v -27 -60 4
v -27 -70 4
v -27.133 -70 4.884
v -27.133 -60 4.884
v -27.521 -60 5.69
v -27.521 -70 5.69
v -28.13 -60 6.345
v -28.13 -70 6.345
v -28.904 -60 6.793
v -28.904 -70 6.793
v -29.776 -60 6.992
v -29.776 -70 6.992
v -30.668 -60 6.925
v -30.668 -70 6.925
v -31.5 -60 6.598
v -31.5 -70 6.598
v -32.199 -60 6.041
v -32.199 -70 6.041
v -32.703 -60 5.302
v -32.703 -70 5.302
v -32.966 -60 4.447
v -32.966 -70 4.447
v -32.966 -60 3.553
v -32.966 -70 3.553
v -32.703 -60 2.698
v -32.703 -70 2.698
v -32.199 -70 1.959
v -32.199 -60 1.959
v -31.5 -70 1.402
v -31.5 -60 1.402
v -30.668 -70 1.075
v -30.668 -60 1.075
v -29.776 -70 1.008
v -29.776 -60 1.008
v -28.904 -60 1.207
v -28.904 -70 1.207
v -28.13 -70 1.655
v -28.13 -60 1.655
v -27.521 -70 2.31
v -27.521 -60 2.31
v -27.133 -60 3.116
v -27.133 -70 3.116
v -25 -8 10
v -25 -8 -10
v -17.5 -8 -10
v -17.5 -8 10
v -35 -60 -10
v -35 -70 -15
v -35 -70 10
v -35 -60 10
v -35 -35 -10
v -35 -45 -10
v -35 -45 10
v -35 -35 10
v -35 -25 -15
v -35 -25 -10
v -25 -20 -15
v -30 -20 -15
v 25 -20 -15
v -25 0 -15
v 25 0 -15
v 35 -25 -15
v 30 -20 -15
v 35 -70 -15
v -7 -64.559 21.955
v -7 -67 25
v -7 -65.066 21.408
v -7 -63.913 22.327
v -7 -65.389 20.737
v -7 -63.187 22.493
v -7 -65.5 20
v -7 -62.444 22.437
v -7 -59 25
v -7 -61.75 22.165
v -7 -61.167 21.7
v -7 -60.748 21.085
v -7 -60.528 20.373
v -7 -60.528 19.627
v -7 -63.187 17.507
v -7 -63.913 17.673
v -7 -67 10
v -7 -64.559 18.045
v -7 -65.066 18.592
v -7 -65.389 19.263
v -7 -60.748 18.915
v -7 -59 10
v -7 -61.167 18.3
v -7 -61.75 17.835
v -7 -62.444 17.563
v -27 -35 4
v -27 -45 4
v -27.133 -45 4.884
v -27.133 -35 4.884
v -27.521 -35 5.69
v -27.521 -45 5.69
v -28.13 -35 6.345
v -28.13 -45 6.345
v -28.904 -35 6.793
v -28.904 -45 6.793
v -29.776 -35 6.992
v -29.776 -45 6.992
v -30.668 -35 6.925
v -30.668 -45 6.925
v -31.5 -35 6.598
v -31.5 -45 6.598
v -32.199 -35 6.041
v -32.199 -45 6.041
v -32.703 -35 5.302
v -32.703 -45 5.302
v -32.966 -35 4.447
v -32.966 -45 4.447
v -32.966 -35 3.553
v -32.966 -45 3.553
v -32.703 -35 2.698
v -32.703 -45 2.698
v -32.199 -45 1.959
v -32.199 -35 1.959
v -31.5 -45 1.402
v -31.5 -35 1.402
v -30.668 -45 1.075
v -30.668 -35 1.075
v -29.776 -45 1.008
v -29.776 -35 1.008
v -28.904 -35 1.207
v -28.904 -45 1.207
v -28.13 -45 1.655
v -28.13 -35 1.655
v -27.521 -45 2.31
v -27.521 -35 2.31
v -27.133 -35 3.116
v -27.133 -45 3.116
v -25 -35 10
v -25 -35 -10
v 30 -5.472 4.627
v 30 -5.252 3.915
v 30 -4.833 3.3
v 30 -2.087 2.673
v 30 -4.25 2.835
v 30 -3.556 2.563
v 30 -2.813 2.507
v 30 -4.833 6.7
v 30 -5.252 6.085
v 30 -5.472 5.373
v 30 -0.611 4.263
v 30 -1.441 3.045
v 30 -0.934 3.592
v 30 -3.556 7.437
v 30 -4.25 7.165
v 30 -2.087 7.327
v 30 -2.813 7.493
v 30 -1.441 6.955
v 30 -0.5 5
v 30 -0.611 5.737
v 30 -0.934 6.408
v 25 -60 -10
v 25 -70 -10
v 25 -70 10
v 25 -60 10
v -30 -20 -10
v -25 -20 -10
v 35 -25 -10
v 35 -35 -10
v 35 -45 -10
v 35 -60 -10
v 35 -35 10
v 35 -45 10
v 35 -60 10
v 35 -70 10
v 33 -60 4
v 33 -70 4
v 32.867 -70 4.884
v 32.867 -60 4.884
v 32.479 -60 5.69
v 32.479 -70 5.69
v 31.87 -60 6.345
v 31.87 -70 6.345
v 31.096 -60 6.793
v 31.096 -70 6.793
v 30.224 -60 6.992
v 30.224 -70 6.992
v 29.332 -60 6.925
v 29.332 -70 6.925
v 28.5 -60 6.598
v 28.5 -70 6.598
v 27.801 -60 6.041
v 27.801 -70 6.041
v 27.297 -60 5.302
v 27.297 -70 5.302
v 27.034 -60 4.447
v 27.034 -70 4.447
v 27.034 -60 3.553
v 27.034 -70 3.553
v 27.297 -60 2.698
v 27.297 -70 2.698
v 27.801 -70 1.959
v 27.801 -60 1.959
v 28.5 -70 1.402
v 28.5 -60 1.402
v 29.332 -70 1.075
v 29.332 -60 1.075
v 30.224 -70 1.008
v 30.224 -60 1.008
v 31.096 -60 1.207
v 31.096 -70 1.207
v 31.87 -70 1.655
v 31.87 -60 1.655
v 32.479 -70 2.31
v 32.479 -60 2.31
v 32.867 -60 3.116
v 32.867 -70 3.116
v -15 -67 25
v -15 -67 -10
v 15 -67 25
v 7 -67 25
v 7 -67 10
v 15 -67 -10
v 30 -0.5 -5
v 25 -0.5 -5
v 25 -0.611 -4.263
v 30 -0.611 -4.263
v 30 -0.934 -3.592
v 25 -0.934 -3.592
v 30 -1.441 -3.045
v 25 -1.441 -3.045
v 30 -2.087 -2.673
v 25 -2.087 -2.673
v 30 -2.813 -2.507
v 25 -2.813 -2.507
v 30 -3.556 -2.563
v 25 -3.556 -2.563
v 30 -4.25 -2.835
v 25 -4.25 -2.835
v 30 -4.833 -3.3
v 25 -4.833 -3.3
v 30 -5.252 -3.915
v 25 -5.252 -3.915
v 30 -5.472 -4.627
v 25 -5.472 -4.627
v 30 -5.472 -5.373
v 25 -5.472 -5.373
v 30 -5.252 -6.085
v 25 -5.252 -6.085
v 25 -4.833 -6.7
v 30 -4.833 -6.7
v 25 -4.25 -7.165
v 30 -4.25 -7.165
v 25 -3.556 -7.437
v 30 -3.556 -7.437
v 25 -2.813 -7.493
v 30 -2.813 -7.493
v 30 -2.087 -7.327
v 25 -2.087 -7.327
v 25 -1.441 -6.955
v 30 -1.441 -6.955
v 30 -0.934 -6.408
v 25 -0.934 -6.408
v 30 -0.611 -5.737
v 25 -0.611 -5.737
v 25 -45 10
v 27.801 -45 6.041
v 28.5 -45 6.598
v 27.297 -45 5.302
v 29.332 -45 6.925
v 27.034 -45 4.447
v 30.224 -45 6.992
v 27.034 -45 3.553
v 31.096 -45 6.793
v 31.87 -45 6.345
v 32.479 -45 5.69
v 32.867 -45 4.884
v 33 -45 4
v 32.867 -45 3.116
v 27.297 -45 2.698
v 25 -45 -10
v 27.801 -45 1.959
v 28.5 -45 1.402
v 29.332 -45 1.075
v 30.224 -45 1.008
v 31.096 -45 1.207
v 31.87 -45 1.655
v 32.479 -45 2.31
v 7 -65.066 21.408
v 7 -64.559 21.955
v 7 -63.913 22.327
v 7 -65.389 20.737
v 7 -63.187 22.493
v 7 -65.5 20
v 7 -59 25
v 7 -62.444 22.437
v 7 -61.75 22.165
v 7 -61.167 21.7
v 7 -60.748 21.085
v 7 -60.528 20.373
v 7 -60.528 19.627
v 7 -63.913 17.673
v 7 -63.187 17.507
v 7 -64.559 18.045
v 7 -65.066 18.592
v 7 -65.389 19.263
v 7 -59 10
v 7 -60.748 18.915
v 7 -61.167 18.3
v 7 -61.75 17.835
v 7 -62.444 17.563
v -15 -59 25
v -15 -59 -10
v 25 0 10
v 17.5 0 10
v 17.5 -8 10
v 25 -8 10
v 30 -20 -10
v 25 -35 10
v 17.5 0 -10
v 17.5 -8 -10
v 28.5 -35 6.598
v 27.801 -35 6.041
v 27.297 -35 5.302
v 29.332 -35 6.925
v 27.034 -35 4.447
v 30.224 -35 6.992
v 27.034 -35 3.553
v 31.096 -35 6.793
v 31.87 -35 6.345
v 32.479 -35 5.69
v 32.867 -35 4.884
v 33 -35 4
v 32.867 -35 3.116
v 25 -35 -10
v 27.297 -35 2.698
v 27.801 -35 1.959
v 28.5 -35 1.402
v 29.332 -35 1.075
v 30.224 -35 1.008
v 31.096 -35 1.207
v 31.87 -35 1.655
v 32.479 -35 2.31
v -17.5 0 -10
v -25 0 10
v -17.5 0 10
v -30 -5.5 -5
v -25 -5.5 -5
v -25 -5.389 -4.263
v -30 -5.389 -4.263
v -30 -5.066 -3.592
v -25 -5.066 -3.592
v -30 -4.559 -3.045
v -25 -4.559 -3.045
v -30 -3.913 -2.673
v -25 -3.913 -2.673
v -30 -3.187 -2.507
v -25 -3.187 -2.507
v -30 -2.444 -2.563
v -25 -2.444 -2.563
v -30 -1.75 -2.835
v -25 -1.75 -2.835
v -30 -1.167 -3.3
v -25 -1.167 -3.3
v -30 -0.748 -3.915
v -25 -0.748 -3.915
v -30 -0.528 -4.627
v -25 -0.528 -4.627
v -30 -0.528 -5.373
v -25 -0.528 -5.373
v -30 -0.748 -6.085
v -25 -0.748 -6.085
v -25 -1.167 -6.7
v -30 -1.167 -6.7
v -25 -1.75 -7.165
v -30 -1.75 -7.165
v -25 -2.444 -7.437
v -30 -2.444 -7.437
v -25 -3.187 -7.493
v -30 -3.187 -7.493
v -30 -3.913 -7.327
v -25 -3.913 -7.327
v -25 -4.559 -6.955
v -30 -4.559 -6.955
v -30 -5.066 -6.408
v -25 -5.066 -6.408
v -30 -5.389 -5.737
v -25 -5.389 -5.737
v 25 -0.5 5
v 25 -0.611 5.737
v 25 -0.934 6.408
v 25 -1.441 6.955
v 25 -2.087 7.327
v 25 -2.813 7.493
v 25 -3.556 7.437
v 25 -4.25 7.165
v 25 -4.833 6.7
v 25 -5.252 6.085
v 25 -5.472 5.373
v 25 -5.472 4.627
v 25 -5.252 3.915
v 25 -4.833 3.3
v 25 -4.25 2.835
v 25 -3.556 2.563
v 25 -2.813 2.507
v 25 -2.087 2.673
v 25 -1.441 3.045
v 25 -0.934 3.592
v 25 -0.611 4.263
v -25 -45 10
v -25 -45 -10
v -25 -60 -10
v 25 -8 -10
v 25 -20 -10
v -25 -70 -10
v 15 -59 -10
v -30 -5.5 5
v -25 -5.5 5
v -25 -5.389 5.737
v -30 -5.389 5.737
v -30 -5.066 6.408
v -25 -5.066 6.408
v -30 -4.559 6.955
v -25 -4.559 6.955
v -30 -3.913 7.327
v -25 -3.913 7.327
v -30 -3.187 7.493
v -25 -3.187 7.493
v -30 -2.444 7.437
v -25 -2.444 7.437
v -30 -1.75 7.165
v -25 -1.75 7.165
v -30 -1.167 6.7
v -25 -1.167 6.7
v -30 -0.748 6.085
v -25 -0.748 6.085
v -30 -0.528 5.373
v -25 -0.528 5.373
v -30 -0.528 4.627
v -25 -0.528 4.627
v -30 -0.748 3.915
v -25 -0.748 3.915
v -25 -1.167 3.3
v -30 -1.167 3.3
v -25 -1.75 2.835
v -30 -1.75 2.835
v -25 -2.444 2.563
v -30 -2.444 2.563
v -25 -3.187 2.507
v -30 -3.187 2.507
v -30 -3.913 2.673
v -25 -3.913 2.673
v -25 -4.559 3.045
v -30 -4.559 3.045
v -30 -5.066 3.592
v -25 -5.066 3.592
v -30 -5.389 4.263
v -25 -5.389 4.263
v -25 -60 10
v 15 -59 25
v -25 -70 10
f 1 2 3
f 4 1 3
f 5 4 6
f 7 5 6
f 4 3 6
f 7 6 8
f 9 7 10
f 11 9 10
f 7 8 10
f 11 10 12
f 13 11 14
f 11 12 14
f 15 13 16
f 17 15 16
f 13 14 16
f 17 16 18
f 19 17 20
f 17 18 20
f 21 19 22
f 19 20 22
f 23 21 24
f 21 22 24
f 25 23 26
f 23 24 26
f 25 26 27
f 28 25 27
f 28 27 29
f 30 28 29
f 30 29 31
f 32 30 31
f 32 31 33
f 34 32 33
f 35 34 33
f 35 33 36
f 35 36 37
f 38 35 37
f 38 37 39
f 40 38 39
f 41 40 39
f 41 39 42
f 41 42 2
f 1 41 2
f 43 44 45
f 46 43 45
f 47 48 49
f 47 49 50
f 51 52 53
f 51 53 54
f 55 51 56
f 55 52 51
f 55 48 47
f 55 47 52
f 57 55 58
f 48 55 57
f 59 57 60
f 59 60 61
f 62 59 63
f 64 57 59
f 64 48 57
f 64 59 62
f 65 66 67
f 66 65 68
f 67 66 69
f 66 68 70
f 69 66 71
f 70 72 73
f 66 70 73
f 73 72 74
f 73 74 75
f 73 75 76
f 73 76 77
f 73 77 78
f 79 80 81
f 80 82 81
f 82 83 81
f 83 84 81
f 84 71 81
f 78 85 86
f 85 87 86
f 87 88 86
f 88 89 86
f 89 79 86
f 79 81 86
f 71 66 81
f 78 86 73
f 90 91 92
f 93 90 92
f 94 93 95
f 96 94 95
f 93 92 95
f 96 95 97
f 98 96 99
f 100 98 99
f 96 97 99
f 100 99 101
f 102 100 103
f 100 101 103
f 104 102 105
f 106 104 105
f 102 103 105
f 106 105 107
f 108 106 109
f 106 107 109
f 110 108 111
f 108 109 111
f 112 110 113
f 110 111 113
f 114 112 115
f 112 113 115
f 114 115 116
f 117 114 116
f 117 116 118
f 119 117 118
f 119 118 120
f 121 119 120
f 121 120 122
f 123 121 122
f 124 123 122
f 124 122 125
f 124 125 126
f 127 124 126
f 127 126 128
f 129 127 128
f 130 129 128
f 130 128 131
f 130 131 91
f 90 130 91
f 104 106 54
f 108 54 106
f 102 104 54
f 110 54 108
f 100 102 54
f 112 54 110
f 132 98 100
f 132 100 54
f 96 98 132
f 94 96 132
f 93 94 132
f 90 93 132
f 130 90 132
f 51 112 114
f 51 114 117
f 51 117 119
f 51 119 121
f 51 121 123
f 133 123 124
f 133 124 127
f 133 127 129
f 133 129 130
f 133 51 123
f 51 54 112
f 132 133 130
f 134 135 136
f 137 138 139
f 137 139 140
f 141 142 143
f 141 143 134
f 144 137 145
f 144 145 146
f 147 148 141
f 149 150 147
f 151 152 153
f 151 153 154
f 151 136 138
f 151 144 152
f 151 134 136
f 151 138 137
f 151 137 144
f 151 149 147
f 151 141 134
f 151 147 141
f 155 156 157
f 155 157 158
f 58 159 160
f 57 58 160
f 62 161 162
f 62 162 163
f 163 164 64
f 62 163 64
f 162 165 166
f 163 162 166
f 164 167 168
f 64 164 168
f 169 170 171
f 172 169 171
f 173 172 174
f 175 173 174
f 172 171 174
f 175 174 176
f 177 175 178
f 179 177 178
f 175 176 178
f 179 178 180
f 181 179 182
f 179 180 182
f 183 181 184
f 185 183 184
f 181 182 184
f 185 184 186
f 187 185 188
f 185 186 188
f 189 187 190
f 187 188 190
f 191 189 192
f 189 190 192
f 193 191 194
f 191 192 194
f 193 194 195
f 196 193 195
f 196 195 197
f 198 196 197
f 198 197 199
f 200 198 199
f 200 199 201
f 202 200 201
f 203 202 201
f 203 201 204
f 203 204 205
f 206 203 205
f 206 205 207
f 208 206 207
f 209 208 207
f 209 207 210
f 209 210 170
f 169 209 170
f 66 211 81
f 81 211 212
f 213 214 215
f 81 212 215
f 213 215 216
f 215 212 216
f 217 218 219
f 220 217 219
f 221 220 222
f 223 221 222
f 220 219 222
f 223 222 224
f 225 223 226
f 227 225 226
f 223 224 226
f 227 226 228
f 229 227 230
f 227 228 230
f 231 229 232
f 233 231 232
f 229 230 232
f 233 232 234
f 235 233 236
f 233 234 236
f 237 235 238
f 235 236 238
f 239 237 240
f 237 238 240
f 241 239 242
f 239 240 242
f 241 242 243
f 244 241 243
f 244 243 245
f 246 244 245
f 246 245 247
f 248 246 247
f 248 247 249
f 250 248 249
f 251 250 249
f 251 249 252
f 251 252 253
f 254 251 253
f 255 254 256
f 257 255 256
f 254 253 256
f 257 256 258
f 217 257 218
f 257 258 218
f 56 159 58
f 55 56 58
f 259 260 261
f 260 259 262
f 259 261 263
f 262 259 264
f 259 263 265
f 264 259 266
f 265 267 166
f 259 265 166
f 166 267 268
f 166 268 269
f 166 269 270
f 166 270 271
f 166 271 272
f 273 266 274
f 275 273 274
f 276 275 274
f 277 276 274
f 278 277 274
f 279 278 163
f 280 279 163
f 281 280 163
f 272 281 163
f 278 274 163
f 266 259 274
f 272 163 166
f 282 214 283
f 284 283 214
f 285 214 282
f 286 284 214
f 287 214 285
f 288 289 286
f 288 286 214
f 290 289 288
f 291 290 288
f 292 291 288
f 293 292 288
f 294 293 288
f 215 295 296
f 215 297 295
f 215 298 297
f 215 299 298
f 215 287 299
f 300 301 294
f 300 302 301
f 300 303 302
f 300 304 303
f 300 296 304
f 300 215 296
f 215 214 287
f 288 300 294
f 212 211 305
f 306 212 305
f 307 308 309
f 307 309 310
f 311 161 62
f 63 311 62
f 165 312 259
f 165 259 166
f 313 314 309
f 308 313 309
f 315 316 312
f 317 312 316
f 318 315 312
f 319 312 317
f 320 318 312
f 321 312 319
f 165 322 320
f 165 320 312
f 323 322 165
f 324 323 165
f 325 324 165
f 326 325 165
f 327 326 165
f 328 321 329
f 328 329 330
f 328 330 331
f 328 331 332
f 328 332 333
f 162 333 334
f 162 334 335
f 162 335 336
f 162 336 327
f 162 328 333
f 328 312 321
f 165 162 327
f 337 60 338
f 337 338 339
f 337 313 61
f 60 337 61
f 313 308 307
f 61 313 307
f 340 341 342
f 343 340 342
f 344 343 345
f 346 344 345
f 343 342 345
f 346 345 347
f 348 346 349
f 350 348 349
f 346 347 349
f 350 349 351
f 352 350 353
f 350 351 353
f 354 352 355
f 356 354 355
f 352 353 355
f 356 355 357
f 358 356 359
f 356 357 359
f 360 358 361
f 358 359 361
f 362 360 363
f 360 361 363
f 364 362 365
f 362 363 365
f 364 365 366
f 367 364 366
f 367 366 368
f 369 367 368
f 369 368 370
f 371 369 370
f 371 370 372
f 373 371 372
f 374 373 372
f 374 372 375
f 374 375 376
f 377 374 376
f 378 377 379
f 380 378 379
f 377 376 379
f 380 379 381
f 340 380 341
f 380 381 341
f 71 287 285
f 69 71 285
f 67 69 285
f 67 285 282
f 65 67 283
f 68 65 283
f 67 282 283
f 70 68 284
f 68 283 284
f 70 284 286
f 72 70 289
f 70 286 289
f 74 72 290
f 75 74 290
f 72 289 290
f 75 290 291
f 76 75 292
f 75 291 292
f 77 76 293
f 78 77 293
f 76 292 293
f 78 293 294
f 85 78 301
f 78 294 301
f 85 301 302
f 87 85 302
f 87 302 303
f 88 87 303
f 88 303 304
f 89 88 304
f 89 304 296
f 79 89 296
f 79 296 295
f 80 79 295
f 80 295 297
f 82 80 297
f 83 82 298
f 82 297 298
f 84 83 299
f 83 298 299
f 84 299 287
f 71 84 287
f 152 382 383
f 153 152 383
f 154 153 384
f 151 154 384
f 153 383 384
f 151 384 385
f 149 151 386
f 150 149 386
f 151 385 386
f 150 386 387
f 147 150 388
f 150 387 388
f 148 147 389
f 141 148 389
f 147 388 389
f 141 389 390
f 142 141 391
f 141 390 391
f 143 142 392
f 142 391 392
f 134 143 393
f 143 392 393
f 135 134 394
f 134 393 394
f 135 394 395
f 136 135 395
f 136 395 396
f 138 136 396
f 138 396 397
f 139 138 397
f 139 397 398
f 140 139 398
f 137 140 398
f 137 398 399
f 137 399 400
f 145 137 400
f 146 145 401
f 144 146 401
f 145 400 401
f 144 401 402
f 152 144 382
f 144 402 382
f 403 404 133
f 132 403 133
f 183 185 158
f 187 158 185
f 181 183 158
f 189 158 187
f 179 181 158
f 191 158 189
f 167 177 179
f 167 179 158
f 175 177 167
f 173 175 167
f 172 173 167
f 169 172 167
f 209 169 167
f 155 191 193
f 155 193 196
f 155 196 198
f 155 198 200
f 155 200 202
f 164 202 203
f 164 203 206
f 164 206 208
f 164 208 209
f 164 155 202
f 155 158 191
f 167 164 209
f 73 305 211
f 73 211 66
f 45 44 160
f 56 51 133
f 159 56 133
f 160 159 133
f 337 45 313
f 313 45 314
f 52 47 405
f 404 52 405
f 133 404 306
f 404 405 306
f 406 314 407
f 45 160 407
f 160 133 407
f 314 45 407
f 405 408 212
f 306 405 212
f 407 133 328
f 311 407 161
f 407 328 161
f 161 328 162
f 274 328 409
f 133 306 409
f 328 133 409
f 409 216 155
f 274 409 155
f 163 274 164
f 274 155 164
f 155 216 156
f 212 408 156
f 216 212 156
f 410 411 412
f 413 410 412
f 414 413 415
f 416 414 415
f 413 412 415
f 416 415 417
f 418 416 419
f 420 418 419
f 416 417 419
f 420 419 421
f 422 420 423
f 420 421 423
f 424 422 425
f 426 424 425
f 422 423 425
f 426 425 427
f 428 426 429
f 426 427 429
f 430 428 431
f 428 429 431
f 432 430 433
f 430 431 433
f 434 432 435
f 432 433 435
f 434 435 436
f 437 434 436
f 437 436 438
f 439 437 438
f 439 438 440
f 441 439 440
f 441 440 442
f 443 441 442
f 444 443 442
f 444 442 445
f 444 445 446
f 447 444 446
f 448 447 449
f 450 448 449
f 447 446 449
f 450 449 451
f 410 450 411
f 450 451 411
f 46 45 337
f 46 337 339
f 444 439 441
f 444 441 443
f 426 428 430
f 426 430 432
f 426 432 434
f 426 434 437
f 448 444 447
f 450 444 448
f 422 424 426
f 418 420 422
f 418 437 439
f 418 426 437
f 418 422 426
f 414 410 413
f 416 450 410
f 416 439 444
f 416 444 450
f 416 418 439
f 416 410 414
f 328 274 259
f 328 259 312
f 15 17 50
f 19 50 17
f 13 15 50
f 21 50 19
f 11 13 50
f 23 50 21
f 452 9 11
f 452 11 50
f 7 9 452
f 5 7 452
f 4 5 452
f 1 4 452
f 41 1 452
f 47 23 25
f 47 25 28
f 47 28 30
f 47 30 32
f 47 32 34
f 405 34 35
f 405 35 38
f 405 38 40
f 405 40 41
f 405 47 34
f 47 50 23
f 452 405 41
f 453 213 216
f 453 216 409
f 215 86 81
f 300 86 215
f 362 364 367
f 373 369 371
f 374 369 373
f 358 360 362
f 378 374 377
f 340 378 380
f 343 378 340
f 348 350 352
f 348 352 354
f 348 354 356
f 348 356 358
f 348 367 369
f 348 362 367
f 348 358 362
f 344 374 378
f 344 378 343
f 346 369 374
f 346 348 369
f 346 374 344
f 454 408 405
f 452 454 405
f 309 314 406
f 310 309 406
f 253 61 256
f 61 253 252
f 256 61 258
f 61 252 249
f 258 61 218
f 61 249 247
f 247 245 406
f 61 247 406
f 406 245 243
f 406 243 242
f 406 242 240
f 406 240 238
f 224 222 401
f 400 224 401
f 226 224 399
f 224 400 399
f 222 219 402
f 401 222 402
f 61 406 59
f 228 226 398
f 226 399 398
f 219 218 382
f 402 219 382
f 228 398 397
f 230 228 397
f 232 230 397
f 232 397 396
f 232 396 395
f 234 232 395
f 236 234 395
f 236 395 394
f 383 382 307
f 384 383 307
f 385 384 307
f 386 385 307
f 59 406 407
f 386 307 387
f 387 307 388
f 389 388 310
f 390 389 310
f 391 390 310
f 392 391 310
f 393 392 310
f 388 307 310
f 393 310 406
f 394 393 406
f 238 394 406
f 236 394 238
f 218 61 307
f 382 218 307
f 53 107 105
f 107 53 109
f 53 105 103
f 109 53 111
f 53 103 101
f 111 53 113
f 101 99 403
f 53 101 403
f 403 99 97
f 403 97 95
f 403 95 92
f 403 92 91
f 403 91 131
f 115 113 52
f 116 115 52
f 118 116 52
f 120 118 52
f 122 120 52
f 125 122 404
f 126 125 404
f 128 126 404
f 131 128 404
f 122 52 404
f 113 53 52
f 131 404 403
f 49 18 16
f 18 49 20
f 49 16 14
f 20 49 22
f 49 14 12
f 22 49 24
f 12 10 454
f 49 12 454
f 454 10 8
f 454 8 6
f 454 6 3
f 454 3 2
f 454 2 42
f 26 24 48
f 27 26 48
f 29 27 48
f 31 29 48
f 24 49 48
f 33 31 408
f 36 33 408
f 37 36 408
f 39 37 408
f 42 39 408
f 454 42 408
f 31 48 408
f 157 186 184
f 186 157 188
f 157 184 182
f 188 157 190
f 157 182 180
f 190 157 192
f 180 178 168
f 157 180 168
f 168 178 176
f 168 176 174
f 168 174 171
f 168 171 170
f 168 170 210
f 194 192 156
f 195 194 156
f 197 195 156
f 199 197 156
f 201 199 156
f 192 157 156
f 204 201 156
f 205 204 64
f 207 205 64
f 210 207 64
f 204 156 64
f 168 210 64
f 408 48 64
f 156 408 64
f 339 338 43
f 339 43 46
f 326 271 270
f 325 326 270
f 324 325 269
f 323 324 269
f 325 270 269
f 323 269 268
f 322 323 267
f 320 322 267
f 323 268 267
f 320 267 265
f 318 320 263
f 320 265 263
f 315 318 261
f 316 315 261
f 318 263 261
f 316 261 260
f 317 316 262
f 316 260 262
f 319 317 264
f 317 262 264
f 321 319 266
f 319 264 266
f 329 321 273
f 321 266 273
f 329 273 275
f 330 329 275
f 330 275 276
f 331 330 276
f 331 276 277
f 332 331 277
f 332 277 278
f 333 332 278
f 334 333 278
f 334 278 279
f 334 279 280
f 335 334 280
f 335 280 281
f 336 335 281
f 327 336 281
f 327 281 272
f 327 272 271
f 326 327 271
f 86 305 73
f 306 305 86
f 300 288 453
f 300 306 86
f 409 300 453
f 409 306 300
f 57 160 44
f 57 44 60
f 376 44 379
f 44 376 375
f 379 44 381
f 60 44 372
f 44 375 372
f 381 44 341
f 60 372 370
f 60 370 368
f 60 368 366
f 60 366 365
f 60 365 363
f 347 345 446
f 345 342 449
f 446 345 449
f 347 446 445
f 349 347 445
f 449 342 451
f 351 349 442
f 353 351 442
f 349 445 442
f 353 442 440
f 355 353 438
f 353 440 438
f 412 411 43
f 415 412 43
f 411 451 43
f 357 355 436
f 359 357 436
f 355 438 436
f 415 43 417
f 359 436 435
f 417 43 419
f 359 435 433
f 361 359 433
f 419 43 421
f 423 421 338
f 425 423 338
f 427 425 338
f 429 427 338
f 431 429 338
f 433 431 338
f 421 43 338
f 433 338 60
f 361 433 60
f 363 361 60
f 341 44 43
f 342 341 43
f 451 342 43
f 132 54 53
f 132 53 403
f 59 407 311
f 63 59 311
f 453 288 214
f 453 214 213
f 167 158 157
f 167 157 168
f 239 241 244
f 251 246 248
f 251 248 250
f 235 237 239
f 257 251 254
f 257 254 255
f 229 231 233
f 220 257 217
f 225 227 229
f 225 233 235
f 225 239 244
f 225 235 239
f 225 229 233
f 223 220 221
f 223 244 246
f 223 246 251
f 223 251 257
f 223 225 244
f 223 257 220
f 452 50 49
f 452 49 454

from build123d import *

# Parameters (mm, degrees)
F0_W      = 50
F0_H      = 20
F1_DEPTH  = 8
F2_R      = 2.5
F3_DEPTH  = 5
F4_R      = 2.5
F5_DEPTH  = 5
F6_W      = 35
F6_H      = 30
F7_DEPTH  = 25
F9_DEPTH  = 5
F10_W     = 8
F10_H     = 8
F11_DEPTH = 35
F12_R     = 2.5
F13_DEPTH = 14
F14_W     = 10
F14_H     = 10
F15_DEPTH = 20
F16_R     = 3
F17_DEPTH = 50
F18_SIZE  = 5
F19_SIZE  = 5
F20_W     = 14
F20_H     = 8
F21_DEPTH = 20


with BuildPart() as f1:
    # F0 (on Front) → F1 (new body)
    with BuildSketch(Plane.XZ):
        Rectangle(F0_W, F0_H)
    extrude(amount=F1_DEPTH)

    # F2 (on face) → F3 (join)
    with BuildSketch(Plane(origin=(-25, 0, 0), x_dir=(0, -1, 0), z_dir=(-1, 0, 0))):
        with Locations((3, 5)):
            Circle(F2_R)
        with Locations((3, -5)):
            Circle(F2_R)
    extrude(amount=F3_DEPTH)

    # F4 (on face) → F5 (join)
    with BuildSketch(Plane.YZ.offset(25)):
        with Locations((-3, 5)):
            Circle(F4_R)
        with Locations((-3, -5)):
            Circle(F4_R)
    extrude(amount=F5_DEPTH)

    # F6 (on face) → F7 (cut)
    with BuildSketch(Plane.XZ.offset(8)):
        with Locations((0, 5)):
            Rectangle(F6_W, F6_H)
    extrude(amount=-F7_DEPTH, mode=Mode.SUBTRACT)

    # F8 (on face) → F9 (join)
    with BuildSketch(Plane(origin=(0, 0, -10), x_dir=(1, 0, 0), z_dir=(0, 0, -1))):
        Polygon((-25, 20), (-25, 0), (25, 0), (25, 20), (35, 20), (35, 70), (-35, 70), (-35, 20), align=None)
    extrude(amount=F9_DEPTH)

    # F10 (on face) → F11 (join)
    with BuildSketch(Plane.XY.offset(-10)):
        with Locations((-11, -63)):
            Rectangle(F10_W, F10_H)
        with Locations((11, -63)):
            Rectangle(F10_W, F10_H)
    extrude(amount=F11_DEPTH)

    # F12 (on face) → F13 (join, through all)
    with BuildSketch(Plane(origin=(7, 0, 0), x_dir=(0, -1, 0), z_dir=(-1, 0, 0))):
        with Locations((63, 20)):
            Circle(F12_R)
    extrude(amount=F13_DEPTH)

    # F14 (on face) → F15 (join)
    with BuildSketch(Plane.XY.offset(-10)):
        with Locations((-30, -65)):
            Rectangle(F14_W, F14_H)
        with Locations((30, -65)):
            Rectangle(F14_W, F14_H)
        with Locations((30, -40)):
            Rectangle(F14_W, F14_H)
        with Locations((-30, -40)):
            Rectangle(F14_W, F14_H)
    extrude(amount=F15_DEPTH)

    # F16 (on face) → F17 (cut)
    with BuildSketch(Plane.XZ.offset(70)):
        with Locations((30, 4)):
            Circle(F16_R)
        with Locations((-30, 4)):
            Circle(F16_R)
    extrude(amount=-F17_DEPTH, mode=Mode.SUBTRACT)

    # F18
    f18_edges = [f1.edges().sort_by_distance(p)[0] for p in [
        (-35, -20, -12.5),
    ]]
    chamfer(f18_edges, length=F18_SIZE)

    # F19
    f19_edges = [f1.edges().sort_by_distance(p)[0] for p in [
        (35, -20, -12.5),
    ]]
    chamfer(f19_edges, length=F19_SIZE)

    # F20 (on face) → F21 (join)
    with BuildSketch(Plane.XY.offset(-10)):
        with Locations((0, -63)):
            Rectangle(F20_W, F20_H)
    extrude(amount=F21_DEPTH)


solid = f1.part
